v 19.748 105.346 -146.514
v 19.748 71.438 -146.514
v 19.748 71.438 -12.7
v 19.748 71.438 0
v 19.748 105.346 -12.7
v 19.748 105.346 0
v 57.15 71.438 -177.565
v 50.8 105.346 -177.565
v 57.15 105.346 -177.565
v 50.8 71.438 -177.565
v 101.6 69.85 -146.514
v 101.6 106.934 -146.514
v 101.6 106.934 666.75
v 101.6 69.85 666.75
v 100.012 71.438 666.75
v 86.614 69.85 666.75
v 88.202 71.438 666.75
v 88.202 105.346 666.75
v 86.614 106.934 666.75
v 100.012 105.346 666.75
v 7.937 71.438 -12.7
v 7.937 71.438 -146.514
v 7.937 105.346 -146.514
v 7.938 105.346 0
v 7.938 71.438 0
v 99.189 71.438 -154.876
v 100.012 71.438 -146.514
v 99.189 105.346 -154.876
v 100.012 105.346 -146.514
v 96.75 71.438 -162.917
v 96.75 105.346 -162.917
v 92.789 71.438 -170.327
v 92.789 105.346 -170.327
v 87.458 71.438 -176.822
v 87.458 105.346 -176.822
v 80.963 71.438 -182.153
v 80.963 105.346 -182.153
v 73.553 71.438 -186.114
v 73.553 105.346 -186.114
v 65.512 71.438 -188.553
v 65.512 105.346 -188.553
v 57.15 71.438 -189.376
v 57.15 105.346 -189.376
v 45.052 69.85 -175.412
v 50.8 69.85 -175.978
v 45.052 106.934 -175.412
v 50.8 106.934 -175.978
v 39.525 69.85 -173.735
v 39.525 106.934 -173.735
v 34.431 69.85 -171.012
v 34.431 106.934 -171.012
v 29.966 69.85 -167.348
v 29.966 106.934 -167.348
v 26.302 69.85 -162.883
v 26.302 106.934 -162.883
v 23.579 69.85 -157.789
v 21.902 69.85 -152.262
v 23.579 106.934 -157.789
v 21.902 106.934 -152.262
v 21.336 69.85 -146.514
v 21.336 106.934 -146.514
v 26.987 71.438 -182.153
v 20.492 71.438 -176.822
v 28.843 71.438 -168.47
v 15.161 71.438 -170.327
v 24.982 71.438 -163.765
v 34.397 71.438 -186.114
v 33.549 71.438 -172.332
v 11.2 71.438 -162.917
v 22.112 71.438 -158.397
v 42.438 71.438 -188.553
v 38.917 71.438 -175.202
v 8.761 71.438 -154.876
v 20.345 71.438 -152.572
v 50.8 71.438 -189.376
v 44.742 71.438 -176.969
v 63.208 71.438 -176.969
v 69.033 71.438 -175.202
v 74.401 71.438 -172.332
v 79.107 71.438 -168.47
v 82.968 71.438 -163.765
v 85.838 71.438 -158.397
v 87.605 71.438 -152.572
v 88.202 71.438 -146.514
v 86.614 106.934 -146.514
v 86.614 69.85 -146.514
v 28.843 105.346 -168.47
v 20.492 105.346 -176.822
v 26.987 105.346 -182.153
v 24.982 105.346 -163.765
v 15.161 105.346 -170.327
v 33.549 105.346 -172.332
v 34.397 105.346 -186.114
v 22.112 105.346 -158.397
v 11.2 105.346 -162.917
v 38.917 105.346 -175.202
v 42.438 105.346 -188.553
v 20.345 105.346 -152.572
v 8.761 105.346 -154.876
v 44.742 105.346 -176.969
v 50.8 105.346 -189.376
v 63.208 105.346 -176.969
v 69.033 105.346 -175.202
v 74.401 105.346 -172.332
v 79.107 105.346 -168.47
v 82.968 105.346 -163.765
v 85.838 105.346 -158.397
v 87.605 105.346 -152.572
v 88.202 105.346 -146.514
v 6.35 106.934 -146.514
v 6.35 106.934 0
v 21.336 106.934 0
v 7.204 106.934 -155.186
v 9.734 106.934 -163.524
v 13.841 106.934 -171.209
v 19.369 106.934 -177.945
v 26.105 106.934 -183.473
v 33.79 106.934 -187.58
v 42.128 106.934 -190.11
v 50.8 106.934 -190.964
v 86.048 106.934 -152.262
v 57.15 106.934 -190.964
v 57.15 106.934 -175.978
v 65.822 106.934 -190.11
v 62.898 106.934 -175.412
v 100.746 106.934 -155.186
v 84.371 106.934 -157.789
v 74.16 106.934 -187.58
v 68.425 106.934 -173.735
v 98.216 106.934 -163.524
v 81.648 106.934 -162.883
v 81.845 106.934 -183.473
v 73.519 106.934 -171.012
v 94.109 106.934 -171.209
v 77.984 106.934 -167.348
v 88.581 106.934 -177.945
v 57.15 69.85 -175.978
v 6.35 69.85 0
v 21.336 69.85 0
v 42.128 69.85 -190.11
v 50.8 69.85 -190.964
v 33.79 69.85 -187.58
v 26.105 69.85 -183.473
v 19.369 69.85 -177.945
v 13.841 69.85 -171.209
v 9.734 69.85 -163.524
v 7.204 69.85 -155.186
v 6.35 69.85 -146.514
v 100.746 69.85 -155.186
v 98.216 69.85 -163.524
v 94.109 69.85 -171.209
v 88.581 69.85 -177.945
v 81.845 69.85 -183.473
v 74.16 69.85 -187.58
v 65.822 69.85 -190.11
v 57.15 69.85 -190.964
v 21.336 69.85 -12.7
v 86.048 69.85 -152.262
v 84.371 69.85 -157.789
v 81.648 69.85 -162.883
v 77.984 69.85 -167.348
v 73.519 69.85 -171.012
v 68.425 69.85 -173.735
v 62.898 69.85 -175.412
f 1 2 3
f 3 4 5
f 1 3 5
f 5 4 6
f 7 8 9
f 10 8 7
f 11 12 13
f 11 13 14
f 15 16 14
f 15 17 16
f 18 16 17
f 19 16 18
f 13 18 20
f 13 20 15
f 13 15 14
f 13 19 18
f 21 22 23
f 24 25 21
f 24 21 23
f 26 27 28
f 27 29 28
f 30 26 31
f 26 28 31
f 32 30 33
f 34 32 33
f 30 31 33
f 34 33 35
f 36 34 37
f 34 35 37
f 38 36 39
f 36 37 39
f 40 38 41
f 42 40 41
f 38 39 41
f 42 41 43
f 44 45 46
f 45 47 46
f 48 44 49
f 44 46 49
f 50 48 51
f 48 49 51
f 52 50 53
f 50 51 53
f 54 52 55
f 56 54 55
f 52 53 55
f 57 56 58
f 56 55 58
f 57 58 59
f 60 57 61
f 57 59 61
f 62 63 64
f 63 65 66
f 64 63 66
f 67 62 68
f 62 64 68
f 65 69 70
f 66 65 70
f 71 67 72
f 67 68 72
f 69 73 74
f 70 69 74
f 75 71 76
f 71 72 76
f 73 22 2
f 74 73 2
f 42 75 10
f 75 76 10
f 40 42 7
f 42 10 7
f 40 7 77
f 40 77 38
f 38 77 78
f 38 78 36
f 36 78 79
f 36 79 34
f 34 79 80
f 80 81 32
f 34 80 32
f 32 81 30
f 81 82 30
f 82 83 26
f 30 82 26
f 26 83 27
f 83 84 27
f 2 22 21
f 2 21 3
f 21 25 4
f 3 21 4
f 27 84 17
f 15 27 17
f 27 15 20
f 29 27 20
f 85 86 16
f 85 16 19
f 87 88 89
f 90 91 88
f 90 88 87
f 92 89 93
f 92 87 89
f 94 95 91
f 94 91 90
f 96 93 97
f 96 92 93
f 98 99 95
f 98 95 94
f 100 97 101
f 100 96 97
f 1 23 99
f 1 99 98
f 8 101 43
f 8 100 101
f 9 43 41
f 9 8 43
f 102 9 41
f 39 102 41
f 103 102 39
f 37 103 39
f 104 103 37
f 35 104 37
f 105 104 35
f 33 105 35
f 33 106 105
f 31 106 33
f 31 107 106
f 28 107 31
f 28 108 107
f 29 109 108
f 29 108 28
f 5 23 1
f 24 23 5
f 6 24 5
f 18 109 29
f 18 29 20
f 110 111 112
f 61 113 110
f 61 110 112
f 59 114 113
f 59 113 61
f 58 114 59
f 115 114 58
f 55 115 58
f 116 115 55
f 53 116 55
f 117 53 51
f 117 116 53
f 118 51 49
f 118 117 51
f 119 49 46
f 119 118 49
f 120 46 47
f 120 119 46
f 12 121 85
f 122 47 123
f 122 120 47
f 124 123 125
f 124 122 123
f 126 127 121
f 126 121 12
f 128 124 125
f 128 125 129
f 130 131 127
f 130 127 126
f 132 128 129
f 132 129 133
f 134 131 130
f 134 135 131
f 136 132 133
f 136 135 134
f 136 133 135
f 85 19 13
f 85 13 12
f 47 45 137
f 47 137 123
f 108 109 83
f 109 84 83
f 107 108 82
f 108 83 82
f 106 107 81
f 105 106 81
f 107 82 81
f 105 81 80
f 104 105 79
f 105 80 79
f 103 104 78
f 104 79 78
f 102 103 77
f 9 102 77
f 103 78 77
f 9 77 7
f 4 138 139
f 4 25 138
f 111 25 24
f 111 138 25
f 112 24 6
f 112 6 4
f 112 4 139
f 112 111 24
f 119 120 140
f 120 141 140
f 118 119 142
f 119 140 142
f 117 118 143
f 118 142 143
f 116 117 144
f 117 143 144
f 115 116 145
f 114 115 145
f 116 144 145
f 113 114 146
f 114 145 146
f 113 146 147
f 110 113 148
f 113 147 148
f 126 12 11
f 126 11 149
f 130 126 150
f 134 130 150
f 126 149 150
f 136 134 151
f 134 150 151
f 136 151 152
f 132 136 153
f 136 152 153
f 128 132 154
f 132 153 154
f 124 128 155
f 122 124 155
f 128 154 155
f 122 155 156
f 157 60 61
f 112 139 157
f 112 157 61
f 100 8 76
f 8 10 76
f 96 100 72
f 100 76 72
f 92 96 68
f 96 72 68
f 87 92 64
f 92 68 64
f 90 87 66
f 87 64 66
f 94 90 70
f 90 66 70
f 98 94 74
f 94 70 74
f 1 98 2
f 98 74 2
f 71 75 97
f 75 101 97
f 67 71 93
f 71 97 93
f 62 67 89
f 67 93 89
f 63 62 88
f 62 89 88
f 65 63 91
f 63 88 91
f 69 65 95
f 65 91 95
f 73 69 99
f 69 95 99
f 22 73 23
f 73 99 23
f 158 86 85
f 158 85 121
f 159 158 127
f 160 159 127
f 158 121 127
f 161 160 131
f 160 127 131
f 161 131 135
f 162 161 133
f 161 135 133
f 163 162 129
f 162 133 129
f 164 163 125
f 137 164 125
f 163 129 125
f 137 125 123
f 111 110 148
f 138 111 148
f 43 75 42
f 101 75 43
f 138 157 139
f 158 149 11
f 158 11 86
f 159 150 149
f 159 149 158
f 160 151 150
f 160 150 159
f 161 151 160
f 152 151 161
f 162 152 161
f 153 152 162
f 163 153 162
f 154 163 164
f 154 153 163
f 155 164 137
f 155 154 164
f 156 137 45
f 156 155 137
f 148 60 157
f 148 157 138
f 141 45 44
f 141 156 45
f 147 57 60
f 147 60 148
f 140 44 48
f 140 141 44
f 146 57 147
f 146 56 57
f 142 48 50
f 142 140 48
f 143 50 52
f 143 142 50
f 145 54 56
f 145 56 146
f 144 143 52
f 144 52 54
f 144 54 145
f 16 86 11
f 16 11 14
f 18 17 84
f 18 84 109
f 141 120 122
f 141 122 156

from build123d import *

# Parameters (mm, degrees)
SKETCH1_W      = 14.986
SKETCH1_H      = 37.084
SKETCH1_W_2    = 11.811
SKETCH1_H_2    = 33.909
EXTRUDE1_DEPTH = 12.7
SKETCH2_W      = 14.986
SKETCH2_H      = 37.084
SKETCH2_W_2    = 11.811
SKETCH2_H_2    = 33.909
EXTRUDE2_DEPTH = 12.7
SKETCH3_W      = 14.986
SKETCH3_H      = 37.084
SKETCH3_W_2    = 11.811
SKETCH3_H_2    = 33.909


with BuildPart() as part:
    # Sketch1 → Extrude1 (new body)
    with BuildSketch(Plane.XY):
        with Locations((13.843, 88.392)):
            Rectangle(SKETCH1_W, SKETCH1_H)
        with Locations((13.843, 88.392)):
            Rectangle(SKETCH1_W_2, SKETCH1_H_2, mode=Mode.SUBTRACT)
    extrude(amount=-EXTRUDE1_DEPTH)



with BuildPart() as body_2:
    # Sketch2 → Extrude2 (new body)
    with BuildSketch(Plane.XY.offset(666.75)):
        with Locations((94.107, 88.392)):
            Rectangle(SKETCH2_W, SKETCH2_H)
        with Locations((94.107, 88.392)):
            Rectangle(SKETCH2_W_2, SKETCH2_H_2, mode=Mode.SUBTRACT)
    extrude(amount=-EXTRUDE2_DEPTH)


with BuildPart() as part_1:
    add(part.part)

    add(body_2.part)  # Sweep1 merges body 2
    # Sweep1: sweep along a curve in space
    with BuildLine() as sweep1_path:
        Line((101.6, 69.85, 654.05), (101.6, 69.85, -146.513751223))
        ThreePointArc((101.6, 69.85, -146.513751223), (88.580896424, 69.85, -177.944647647), (57.15, 69.85, -190.963751223))
        Line((57.15, 69.85, -190.963751223), (50.8, 69.85, -190.963751223))
        ThreePointArc((6.35, 69.85, -146.513751223), (19.369103576, 69.85, -177.944647647), (50.8, 69.85, -190.963751223))
        Line((6.35, 69.85, -146.513751223), (6.35, 69.85, -12.7))
    # Sketch3 → Sweep1 (sweep)
    with BuildSketch(Plane(origin=(0, 0, 654.05), x_dir=(-1, 0, 0), z_dir=(0, 0, -1))):
        with Locations((-94.107, 88.392)):
            Rectangle(SKETCH3_W, SKETCH3_H)
        with Locations((-94.107, 88.392)):
            Rectangle(SKETCH3_W_2, SKETCH3_H_2, mode=Mode.SUBTRACT)
    sweep(path=sweep1_path.line)


solid = part_1.part
